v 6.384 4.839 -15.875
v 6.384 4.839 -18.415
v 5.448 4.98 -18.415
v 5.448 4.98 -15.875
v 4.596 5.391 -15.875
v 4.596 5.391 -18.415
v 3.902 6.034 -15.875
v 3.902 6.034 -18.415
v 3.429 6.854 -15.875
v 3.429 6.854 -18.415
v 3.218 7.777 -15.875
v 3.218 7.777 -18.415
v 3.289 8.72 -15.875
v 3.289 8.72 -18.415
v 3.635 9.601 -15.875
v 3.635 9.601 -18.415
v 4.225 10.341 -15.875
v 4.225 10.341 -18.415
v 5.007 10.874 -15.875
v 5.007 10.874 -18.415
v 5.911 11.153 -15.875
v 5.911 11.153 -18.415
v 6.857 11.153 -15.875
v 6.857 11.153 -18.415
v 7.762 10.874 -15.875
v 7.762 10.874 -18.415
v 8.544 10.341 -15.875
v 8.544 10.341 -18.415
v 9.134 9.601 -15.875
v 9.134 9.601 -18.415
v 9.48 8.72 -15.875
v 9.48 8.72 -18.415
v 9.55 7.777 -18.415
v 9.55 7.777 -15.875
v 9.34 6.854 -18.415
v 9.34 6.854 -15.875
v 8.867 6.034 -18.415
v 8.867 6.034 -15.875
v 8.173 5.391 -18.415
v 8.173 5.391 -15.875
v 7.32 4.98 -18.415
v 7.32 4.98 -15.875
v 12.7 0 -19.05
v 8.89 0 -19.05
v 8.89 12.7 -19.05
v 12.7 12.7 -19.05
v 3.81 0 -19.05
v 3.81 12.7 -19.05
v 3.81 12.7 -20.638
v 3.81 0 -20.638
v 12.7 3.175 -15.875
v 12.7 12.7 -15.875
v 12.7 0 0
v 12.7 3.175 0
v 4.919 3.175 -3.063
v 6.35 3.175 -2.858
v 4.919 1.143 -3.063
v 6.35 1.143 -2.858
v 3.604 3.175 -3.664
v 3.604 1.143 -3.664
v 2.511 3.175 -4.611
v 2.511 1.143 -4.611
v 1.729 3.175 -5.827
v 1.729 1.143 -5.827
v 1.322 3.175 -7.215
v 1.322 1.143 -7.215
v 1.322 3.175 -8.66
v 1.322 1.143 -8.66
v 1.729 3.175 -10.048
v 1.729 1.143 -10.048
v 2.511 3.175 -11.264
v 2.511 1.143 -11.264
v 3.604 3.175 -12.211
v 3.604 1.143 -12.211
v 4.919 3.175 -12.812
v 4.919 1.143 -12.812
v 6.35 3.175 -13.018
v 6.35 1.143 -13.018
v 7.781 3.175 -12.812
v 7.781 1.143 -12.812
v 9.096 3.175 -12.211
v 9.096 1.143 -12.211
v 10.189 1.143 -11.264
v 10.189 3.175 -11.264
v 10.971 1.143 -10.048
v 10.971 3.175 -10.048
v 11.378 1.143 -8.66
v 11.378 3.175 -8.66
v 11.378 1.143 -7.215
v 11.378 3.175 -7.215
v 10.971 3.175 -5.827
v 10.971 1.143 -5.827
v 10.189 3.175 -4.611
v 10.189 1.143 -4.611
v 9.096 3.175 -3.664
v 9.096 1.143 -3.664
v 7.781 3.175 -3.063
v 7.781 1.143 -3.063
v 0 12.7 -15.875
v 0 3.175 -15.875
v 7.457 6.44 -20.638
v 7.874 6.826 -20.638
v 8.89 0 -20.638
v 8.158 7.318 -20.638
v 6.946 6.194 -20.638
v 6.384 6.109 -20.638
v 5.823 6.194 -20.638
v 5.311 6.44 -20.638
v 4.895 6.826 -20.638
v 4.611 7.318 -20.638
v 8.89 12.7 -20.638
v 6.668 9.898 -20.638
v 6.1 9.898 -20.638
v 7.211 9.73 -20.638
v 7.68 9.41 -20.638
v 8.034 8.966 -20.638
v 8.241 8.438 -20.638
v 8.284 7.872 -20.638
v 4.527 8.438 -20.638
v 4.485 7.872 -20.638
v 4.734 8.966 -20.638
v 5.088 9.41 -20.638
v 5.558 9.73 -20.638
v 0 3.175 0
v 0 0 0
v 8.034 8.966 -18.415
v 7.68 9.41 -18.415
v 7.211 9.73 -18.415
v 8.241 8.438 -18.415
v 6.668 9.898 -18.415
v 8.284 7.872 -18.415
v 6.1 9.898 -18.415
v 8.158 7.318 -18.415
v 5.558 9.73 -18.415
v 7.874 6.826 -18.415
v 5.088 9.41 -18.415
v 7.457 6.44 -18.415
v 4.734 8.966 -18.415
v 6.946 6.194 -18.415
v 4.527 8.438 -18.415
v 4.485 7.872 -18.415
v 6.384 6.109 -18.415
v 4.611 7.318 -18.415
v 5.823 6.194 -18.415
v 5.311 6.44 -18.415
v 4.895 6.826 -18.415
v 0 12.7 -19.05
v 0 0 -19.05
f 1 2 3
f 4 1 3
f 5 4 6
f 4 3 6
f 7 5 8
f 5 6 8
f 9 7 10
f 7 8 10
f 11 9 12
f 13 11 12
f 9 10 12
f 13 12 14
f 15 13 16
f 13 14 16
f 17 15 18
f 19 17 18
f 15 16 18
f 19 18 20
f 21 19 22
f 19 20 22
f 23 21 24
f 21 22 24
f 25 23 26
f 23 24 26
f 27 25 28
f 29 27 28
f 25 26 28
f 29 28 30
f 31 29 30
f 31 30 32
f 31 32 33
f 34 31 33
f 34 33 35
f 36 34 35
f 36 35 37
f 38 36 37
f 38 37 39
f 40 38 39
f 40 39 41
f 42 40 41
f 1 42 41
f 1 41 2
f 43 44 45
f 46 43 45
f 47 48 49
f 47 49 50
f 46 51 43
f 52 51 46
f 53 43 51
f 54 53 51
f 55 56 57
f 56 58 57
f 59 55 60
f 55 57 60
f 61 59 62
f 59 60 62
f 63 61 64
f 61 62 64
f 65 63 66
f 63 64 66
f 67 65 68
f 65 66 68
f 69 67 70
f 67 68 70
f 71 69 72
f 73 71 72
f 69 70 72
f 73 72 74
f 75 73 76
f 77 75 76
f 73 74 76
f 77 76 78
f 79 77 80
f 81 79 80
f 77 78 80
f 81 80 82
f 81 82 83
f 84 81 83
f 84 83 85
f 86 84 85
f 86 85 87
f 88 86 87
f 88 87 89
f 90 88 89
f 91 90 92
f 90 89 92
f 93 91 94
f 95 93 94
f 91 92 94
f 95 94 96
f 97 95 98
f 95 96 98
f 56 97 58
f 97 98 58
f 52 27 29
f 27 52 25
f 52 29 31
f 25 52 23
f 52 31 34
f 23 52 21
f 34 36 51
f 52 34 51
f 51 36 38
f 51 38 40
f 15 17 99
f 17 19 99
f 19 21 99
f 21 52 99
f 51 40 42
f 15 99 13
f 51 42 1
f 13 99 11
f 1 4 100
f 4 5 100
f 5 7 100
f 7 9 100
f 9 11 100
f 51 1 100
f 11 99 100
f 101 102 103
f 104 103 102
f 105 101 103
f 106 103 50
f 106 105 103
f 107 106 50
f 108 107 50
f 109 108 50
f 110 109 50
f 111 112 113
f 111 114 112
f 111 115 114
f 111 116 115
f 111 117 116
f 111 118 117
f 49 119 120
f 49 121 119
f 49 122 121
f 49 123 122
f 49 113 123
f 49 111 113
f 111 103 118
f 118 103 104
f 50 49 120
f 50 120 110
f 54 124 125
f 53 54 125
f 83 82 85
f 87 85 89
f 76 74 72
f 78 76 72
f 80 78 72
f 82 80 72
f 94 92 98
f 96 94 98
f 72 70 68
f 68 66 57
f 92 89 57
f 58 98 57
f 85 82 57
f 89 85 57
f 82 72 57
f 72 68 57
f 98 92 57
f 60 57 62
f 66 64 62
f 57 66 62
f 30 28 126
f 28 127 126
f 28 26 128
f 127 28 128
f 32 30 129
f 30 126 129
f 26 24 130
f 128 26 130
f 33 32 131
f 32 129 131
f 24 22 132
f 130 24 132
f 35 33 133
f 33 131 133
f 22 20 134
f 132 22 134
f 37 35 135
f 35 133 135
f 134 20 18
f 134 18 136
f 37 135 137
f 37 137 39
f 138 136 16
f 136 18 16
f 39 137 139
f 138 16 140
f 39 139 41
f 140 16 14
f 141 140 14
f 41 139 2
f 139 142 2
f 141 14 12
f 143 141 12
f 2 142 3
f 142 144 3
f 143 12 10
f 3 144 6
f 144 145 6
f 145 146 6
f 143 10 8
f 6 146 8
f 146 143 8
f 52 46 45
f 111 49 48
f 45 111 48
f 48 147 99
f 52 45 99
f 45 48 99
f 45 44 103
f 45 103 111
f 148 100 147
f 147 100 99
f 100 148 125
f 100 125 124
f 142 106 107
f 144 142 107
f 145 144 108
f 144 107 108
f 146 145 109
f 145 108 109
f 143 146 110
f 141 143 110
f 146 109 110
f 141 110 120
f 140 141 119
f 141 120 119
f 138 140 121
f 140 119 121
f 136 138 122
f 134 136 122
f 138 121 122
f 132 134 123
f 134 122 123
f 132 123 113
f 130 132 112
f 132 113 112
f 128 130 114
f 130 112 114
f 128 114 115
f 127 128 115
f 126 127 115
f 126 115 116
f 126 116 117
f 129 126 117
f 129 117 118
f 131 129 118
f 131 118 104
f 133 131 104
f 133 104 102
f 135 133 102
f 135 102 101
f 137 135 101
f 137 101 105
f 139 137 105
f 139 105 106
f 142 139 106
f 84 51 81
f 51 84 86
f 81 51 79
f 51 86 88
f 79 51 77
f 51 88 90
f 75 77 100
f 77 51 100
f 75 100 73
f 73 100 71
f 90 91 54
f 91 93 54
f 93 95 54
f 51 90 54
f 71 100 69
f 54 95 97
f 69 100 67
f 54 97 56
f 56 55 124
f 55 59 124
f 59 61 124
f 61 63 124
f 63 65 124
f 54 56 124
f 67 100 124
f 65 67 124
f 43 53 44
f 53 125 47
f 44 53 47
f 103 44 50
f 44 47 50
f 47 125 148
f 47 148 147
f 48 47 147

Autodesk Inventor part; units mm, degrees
ref_plane "YZ Plane" through (0, 0, 0) normal (1, 0, 0) x (0, 1, 0)
ref_plane "XZ Plane" through (0, 0, 0) normal (0, 1, 0) x (-1, 0, 0)
ref_plane "XY Plane" through (0, 0, 0) normal (0, 0, 1) x (1, 0, 0)
sketch "Sketch1" plane through (0, 0, 0) normal (1, 0, 0) x (0, 1, 0)
  line L0 (0, 0) -> (0, -19.05)
  line L1 (0, -19.05) -> (12.7, -19.05)
  line L2 (12.7, -19.05) -> (12.7, -15.875)
  line L3 (12.7, -15.875) -> (3.175, -15.875)
  line L4 (3.175, -15.875) -> (3.175, 0)
  line L5 (3.175, 0) -> (0, 0)
  dimension "d0" = 3.175
  dimension "d1" = 12.7
  dimension "d4" = 3.175
  dimension "d5" = 19.05
extrude "Extrusion1" add sketch "Sketch1" along normal blind 12.7
sketch "Sketch3" plane through (0, 3.175, 0) normal (0, 1, 0) x (1, 0, 0)
  line L0 (0, 15.875) -> (0, 0) projected
  line L1 (0, 0) -> (12.7, 0) projected
  line L2 (12.7, 15.875) -> (12.7, 0) projected
  line L3 (0, 15.875) -> (12.7, 15.875) projected
  point P0 (0, 0)
  point P1 (6.35, 7.9375)
hole "Hole2" at (6.35, 3.175, -7.9375) direction (0, -1, 0) diameter 10.16 depth 2.032
sketch "Sketch4" plane through (0, 0, -19.05) normal (0, 0, -1) x (-1, 0, 0)
  line L0 (0, 12.7) -> (-12.7, 12.7) projected
  line L1 (0, 0) -> (-12.7, 0) projected
  line L2 (-8.89, 12.7) -> (-3.81, 12.7)
  line L3 (-3.81, 12.7) -> (-3.81, 0)
  line L4 (-3.81, 0) -> (-8.89, 0)
  line L5 (-8.89, 0) -> (-8.89, 12.7)
  line L6 (0, 0) -> (0, 12.7) projected
  line L7 (0, 12.7) -> (-12.7, 12.7) projected
  line L8 (-12.7, 0) -> (-12.7, 12.7) projected
  line L9 (0, 0) -> (-12.7, 0) projected
  dimension "d22" = 5.08
  dimension "d23" = 12.7
  dimension "d24" = 3.81
extrude "Extrusion2" add sketch "Sketch4" along normal blind 1.5875 contours L3 L1 L5 L0
sketch "Sketch5" plane through (0, 3.175, -15.875) normal (0, 0, 1) x (1, 0, 0)
  line L0 (0, 9.525) -> (0, 0) projected
  line L1 (0, 0) -> (12.7, 0) projected
  line L2 (12.7, 9.525) -> (12.7, 0) projected
  line L3 (0, 9.525) -> (12.7, 9.525) projected
  point P0 (0, -3.175)
  point P1 (6.3842, 4.8389)
hole "Hole3" at (6.3842, 8.0139, -15.875) direction (0, 0, -1) diameter 3.81 end through all counterbore diameter 6.35 counterbore depth 2.54
equation "\"d4\" = d0"
equation "\"d24\" = -0.5 * d22 + 0.5 * d23"
properties part number "spring tab for on arm"
